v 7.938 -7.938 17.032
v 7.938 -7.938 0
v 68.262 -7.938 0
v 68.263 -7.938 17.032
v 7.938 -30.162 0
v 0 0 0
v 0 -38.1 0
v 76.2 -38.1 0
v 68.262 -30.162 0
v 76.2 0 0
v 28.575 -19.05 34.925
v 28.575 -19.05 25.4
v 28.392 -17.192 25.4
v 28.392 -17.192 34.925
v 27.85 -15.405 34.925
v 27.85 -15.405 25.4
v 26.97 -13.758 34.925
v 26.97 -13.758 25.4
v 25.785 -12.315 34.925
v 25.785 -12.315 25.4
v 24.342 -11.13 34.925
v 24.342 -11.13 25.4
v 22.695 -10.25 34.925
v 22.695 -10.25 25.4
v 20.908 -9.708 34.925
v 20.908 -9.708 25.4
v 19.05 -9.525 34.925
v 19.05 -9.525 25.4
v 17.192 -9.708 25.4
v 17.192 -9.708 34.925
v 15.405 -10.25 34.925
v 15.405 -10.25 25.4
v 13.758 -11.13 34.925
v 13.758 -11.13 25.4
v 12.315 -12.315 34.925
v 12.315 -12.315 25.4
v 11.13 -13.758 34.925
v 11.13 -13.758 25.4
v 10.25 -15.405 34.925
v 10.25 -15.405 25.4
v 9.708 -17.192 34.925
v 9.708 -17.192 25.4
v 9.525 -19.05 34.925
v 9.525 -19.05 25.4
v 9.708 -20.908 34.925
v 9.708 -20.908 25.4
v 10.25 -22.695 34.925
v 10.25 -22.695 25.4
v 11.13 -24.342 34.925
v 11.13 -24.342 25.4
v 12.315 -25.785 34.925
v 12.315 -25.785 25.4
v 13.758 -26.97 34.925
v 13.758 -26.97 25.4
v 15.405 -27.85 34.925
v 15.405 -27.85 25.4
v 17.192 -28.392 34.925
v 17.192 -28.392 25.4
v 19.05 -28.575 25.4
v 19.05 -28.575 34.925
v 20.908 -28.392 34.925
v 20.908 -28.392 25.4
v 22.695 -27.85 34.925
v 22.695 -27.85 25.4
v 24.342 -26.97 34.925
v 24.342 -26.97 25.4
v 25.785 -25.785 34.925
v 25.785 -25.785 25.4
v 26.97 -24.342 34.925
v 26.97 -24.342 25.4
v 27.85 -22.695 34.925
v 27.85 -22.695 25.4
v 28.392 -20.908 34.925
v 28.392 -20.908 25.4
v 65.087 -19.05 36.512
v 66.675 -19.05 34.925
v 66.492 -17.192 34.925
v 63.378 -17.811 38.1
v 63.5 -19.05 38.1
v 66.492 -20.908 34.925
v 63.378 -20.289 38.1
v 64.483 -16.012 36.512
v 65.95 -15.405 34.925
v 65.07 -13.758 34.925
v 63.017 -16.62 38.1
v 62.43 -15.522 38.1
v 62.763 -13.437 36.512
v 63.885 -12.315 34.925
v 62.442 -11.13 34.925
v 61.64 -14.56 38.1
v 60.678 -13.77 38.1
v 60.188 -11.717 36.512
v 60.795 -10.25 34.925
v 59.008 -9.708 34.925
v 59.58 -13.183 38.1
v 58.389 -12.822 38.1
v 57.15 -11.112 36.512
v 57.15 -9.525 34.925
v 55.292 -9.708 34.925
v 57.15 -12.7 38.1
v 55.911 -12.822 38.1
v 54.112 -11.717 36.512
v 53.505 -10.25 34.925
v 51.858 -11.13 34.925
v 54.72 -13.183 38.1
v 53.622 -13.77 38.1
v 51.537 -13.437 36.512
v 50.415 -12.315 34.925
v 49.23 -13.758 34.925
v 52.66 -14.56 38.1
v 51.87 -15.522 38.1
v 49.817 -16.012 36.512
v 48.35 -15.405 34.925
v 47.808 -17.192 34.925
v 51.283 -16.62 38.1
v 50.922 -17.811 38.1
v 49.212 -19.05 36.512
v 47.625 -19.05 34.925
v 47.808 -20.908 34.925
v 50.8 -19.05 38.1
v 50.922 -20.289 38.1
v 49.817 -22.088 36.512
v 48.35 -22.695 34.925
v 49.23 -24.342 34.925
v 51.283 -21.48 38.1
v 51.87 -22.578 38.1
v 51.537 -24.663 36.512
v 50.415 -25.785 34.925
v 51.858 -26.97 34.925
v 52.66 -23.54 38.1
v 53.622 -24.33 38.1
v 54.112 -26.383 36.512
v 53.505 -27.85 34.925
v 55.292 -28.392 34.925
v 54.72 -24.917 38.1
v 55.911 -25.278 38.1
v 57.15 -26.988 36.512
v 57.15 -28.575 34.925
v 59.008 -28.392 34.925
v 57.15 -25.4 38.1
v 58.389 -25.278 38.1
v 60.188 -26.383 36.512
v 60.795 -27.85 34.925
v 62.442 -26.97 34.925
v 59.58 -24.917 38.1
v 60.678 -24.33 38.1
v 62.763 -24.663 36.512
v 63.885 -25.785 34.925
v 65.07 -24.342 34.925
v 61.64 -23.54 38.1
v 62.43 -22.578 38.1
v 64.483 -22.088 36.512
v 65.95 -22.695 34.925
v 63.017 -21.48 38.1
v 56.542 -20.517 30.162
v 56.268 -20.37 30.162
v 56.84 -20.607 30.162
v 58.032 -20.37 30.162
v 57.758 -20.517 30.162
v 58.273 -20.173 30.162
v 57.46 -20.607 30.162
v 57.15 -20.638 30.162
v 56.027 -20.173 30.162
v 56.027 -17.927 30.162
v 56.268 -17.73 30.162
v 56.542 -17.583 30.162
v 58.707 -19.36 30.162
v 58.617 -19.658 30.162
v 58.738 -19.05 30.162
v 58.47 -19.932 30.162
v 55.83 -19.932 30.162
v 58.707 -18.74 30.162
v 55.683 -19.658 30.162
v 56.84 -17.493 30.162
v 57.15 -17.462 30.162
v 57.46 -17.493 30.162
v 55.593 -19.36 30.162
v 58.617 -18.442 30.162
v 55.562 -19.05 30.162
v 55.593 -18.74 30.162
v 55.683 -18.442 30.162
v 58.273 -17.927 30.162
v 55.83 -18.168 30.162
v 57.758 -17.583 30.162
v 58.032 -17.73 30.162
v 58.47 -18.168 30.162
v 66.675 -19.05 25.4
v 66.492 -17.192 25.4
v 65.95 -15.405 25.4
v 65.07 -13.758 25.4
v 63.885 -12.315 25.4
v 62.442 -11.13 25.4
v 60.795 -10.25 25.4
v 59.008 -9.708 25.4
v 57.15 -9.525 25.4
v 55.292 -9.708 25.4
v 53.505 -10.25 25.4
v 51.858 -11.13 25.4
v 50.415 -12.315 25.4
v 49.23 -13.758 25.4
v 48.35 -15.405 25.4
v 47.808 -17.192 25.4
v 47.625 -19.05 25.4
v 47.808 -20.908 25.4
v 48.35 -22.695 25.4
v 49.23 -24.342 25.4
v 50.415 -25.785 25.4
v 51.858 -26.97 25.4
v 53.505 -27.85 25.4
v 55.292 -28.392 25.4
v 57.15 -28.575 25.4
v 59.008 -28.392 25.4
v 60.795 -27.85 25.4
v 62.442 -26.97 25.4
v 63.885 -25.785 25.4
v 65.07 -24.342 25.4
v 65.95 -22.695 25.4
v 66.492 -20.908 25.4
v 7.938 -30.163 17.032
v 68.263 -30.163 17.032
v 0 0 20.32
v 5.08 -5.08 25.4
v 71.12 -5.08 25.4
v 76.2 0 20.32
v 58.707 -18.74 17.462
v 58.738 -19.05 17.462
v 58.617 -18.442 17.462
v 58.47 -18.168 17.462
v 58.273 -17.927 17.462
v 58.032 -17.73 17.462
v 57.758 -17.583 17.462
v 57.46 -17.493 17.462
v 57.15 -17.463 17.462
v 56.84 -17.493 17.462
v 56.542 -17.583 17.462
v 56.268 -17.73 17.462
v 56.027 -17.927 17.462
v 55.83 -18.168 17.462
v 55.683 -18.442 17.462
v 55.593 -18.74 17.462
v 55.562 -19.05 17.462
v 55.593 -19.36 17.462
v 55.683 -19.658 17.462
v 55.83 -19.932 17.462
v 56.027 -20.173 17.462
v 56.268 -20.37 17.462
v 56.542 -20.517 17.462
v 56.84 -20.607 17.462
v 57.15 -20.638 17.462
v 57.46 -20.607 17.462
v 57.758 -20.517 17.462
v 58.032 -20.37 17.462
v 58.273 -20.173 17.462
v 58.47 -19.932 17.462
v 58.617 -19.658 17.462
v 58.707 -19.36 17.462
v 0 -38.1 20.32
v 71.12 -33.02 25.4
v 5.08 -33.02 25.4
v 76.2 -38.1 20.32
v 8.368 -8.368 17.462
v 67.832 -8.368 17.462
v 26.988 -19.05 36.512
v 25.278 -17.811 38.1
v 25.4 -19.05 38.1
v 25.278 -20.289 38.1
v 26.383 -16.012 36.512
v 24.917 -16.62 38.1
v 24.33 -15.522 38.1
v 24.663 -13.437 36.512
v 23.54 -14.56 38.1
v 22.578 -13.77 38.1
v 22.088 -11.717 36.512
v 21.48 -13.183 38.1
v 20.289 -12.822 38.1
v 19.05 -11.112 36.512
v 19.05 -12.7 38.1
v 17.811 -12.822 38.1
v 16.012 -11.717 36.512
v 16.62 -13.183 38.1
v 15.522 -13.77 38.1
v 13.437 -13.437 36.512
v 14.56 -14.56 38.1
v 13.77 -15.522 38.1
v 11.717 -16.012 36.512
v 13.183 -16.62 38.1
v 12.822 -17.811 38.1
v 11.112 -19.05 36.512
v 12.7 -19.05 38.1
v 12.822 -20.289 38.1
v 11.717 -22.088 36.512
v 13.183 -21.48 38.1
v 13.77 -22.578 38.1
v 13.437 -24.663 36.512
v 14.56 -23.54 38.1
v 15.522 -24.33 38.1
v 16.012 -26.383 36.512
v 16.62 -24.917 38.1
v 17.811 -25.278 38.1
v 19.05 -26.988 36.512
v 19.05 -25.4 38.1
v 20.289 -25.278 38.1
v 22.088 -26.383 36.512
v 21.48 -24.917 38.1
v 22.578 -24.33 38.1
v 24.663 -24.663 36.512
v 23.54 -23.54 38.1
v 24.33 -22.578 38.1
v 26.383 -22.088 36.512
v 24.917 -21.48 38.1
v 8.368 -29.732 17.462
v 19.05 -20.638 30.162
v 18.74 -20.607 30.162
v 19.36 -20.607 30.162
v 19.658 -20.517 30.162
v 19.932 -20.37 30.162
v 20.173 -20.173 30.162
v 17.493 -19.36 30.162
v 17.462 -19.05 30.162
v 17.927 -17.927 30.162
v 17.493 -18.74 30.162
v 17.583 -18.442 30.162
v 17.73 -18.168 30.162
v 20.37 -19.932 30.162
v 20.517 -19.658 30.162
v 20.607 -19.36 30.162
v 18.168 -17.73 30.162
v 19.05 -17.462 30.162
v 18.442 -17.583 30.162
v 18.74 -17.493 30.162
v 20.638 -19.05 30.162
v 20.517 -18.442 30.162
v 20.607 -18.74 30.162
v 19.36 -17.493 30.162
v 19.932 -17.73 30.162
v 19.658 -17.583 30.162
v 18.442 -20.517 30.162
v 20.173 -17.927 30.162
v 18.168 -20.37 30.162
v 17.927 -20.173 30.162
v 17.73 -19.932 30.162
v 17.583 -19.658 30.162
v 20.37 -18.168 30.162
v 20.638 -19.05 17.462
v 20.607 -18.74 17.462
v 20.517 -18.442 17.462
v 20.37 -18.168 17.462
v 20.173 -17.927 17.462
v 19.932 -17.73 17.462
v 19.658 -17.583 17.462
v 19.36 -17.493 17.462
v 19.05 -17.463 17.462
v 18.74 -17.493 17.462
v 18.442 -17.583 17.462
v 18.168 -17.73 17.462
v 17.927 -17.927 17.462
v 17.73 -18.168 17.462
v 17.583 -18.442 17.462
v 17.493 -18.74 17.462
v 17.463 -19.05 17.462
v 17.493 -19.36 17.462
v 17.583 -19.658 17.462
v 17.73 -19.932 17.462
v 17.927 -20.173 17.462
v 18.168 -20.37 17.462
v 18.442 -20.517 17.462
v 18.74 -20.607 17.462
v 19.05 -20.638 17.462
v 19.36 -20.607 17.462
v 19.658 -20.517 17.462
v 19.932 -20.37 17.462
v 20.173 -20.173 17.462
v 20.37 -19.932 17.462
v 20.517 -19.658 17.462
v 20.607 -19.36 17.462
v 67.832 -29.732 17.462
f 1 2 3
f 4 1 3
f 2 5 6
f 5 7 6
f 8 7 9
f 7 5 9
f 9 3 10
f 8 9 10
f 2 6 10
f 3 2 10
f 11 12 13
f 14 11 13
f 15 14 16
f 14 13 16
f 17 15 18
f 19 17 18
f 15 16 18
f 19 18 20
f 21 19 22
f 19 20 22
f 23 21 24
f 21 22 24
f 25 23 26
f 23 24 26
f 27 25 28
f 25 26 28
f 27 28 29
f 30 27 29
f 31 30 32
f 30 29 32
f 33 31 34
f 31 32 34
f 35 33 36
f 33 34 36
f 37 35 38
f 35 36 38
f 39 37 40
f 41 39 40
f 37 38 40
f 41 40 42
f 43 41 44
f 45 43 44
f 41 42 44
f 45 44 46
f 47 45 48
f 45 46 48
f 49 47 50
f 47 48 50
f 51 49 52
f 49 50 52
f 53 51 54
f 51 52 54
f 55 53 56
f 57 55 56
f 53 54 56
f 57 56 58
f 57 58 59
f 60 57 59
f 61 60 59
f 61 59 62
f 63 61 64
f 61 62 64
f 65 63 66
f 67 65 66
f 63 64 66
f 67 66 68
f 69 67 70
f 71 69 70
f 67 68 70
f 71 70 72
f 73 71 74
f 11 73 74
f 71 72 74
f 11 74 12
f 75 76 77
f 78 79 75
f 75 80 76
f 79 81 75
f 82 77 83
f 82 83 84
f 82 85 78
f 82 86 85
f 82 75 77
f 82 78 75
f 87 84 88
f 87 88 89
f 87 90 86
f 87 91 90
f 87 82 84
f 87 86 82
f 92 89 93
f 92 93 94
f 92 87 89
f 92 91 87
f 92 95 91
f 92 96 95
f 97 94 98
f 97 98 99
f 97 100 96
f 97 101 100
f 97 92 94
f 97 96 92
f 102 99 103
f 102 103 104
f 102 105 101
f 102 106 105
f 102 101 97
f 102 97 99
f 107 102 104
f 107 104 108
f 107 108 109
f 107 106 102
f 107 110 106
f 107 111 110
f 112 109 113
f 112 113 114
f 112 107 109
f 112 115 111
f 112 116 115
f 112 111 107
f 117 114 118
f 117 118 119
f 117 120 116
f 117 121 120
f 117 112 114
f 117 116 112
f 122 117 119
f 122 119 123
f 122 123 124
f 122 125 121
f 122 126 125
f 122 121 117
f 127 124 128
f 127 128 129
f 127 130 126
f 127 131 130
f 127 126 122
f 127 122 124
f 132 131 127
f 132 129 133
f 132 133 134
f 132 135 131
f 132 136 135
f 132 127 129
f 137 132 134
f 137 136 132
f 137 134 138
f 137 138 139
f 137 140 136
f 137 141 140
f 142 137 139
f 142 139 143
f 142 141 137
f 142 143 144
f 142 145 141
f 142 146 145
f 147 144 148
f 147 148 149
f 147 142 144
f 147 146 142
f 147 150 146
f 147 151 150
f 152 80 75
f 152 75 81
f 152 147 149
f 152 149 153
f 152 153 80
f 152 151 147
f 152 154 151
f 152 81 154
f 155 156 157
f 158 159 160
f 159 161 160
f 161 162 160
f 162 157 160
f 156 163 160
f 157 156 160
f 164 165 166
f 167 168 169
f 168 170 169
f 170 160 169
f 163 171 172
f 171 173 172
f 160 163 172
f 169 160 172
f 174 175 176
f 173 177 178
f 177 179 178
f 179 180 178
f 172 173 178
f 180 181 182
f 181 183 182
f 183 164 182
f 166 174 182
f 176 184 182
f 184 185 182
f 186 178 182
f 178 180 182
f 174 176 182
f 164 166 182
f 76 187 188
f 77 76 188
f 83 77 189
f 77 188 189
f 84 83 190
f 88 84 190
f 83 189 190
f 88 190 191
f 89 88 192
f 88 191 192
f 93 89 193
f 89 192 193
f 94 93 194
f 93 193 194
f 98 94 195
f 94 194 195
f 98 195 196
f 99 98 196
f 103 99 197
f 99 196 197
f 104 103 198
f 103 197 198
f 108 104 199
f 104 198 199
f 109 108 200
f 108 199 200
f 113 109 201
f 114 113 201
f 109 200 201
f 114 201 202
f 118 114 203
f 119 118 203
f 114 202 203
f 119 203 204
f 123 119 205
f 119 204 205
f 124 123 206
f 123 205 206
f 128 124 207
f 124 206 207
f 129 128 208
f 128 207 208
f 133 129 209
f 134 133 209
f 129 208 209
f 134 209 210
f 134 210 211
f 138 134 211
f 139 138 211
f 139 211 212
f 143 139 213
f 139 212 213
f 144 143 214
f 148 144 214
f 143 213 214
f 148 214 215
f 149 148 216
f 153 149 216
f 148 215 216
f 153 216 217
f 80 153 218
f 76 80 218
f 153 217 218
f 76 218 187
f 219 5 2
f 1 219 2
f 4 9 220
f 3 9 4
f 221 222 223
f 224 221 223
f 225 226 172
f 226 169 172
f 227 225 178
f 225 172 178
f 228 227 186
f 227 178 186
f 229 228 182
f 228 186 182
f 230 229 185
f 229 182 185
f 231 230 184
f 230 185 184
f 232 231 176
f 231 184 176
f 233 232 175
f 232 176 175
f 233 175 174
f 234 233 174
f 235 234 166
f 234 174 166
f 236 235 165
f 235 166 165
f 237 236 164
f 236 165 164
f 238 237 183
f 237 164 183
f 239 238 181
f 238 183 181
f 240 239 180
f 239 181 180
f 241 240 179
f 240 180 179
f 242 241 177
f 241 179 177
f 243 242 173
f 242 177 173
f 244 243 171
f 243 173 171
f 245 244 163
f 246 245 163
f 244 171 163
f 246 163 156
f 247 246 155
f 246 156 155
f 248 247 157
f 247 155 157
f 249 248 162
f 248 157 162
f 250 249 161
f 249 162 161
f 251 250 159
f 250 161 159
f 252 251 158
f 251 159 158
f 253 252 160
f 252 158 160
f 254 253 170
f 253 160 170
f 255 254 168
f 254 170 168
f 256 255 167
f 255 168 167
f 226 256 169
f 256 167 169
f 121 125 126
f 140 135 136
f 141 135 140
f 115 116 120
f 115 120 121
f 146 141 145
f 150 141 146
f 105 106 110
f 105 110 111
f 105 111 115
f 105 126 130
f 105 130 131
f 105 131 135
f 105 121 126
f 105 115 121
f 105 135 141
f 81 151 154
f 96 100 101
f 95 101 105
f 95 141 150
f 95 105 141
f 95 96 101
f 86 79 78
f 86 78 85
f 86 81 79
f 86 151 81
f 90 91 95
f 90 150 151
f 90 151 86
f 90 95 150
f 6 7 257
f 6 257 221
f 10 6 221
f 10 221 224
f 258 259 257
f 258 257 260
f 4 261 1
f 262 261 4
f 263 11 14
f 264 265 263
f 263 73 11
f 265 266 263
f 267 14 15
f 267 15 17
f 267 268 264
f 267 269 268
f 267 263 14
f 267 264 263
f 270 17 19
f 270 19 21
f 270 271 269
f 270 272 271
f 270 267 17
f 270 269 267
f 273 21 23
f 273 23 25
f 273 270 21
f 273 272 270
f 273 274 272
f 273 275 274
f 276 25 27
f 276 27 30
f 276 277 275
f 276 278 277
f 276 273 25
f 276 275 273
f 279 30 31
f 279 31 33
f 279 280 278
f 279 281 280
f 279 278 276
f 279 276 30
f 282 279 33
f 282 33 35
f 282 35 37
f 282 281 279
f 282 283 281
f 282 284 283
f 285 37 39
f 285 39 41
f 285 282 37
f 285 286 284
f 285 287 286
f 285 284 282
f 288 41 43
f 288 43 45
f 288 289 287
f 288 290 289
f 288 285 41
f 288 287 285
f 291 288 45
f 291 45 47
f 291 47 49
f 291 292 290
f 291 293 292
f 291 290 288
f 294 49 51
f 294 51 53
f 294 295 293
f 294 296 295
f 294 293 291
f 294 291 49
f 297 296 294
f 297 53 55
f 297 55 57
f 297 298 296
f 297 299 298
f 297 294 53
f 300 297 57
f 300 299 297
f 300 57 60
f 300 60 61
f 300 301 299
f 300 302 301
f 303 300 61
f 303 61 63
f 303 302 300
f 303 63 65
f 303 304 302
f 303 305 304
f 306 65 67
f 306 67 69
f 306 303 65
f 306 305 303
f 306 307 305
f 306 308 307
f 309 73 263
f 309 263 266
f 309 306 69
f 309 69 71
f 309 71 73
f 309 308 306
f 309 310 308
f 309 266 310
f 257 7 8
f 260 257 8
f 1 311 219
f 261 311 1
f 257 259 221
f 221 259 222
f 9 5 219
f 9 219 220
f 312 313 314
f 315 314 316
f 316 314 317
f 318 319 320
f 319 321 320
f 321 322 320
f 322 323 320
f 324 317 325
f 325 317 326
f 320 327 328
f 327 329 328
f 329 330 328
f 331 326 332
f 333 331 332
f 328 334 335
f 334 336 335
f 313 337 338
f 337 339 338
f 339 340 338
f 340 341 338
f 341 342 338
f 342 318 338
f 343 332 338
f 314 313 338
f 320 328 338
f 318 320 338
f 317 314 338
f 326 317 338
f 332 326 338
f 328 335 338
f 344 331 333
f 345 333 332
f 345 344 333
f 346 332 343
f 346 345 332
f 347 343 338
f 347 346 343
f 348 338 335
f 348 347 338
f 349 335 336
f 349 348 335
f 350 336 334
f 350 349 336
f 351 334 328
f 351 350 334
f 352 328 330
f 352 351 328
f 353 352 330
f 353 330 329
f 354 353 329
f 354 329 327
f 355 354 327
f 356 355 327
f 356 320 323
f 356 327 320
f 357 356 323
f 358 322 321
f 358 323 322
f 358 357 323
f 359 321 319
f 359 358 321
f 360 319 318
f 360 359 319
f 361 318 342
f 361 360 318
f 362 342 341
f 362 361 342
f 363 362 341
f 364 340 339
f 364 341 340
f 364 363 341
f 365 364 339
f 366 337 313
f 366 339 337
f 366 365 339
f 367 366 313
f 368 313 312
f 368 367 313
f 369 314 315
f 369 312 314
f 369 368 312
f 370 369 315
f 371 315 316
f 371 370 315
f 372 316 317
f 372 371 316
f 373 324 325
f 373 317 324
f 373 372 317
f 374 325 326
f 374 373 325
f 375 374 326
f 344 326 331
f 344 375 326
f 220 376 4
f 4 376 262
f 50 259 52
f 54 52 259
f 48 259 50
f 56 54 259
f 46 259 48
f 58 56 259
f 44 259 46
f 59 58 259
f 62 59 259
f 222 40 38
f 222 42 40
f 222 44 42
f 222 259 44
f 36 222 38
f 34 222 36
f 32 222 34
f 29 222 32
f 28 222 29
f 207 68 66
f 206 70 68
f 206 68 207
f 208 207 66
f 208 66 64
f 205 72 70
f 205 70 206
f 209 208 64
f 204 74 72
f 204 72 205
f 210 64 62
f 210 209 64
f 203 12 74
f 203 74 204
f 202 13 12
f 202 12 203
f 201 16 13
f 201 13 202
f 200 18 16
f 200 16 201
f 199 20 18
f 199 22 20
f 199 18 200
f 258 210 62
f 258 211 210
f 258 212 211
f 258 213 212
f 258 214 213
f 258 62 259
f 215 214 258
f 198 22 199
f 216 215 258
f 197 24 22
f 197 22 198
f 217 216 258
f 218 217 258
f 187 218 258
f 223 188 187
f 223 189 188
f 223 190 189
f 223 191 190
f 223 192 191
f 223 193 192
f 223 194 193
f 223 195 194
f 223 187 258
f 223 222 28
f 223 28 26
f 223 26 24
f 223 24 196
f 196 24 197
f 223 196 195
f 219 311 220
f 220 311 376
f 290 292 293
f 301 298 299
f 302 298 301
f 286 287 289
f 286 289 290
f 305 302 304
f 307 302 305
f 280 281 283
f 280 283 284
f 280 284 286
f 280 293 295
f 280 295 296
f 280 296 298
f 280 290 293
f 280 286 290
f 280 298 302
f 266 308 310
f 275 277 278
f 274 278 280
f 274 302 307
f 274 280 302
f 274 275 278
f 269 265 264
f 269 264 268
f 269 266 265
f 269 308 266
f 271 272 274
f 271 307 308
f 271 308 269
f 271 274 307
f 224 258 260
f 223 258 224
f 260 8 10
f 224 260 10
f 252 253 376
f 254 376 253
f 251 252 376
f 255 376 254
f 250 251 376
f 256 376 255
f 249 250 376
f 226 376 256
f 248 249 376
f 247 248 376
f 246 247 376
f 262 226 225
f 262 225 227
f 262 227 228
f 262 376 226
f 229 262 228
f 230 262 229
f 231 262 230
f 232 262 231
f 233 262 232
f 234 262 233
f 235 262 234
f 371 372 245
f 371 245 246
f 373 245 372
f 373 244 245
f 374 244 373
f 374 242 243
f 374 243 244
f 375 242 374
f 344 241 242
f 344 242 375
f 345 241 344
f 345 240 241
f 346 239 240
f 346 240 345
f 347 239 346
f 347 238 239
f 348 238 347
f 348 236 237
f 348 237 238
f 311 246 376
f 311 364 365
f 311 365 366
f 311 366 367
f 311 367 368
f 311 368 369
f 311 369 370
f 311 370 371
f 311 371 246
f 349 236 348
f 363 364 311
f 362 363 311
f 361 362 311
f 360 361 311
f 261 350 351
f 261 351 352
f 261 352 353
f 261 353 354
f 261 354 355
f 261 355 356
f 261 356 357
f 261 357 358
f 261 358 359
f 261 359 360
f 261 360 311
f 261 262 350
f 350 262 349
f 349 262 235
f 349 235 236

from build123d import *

# Parameters (mm, degrees)
F0_W     = 76.2
F0_H     = 38.1
F1_DEPTH = 25.4
F2_SIZE  = 5.08
F3_R     = 9.525
F4_DEPTH = 12.7
F5_SIZE2 = 3.175
F5_SIZE  = 3.175
F6_T     = 7.9375


# Not quite as in the source:
# - a shell that OpenCascade refuses in one call is made with other operations: the cavity is built on its own and cut out


with BuildPart() as f1:
    # F0 (on Top) → F1 (new body)
    with BuildSketch(Plane.XY):
        with Locations((38.1, -19.05)):
            Rectangle(F0_W, F0_H)
    extrude(amount=F1_DEPTH)

    # F2
    f2_edges = [f1.edges().sort_by_distance(p)[0] for p in [
        (38.1, -38.1, 25.4),
        (76.2, -19.05, 25.4),
        (38.1, 0, 25.4),
        (0, -19.05, 25.4),
    ]]
    chamfer(f2_edges, length=F2_SIZE)

    # F3 (on face) → F4 (join)
    with BuildSketch(Plane.XY.offset(25.4)):
        with Locations((19.05, -19.05)):
            Circle(F3_R)
        with Locations((57.15, -19.05)):
            Circle(F3_R)
    extrude(amount=F4_DEPTH)

    # F5
    f5_edges = [f1.edges().sort_by_distance(p)[0] for p in [
        (9.525, -19.05, 38.1),
        (47.625, -19.05, 38.1),
    ]]
    chamfer(f5_edges, length=F5_SIZE, length2=F5_SIZE2)

    # F6: shell of thickness 7.9375, made by hand


with BuildPart() as f6_core1:
    # F6_t2: copy of F1
    add(f1.part)

    # the walls: a layer under each face that stays
    f6_faces = [f6_core1.faces().sort_by_distance(p)[0] for p in [
        (9.525, -19.05, 30.1625),
        (11.1125, -19.05, 36.5125),
        (38.1, -19.05, 25.4),
        (19.05, -19.05, 38.1),
        (38.1, -35.56, 22.86),
        (2.54, -19.05, 22.86),
        (73.66, -19.05, 22.86),
        (38.1, -2.54, 22.86),
        (47.625, -19.05, 30.1625),
        (38.1, -38.1, 10.16),
        (0, -19.05, 10.16),
        (76.2, -19.05, 10.16),
        (38.1, 0, 10.16),
        (49.2125, -19.05, 36.5125),
        (57.15, -19.05, 38.1),
    ]]
    thicken(f6_faces, amount=-F6_T, mode=Mode.SUBTRACT)

    # F6_s3 → F6_t4 (revolve, cut)
    with BuildSketch(Plane.XZ.offset(19.05)):
        Polygon((28.654375, 25.479375), (20.6375, 25.4), (20.6375, 17.4625), (28.575, 17.4625), align=None)
    revolve(axis=Axis((19.05, -19.05, 25.4), (0, 0, 1)), mode=Mode.SUBTRACT)

    # F6_s5 → F6_t6 (revolve, cut)
    with BuildSketch(Plane.XZ.offset(19.05)):
        Polygon((66.754375, 25.479375), (66.675, 17.4625), (58.7375, 17.4625), (58.7375, 25.4), align=None)
    revolve(axis=Axis((57.15, -19.05, 25.4), (0, 0, 1)), mode=Mode.SUBTRACT)


with BuildPart() as f1_1:
    add(f1.part)

    # what is left inside the walls is the cavity
    f6_cavity = [f6_core1.part.solids().sort_by_distance(p)[0] for p in [
        (38.1, -22.754167, 0.079375),
    ]]
    add(f6_cavity, mode=Mode.SUBTRACT)


solid = f1_1.part
